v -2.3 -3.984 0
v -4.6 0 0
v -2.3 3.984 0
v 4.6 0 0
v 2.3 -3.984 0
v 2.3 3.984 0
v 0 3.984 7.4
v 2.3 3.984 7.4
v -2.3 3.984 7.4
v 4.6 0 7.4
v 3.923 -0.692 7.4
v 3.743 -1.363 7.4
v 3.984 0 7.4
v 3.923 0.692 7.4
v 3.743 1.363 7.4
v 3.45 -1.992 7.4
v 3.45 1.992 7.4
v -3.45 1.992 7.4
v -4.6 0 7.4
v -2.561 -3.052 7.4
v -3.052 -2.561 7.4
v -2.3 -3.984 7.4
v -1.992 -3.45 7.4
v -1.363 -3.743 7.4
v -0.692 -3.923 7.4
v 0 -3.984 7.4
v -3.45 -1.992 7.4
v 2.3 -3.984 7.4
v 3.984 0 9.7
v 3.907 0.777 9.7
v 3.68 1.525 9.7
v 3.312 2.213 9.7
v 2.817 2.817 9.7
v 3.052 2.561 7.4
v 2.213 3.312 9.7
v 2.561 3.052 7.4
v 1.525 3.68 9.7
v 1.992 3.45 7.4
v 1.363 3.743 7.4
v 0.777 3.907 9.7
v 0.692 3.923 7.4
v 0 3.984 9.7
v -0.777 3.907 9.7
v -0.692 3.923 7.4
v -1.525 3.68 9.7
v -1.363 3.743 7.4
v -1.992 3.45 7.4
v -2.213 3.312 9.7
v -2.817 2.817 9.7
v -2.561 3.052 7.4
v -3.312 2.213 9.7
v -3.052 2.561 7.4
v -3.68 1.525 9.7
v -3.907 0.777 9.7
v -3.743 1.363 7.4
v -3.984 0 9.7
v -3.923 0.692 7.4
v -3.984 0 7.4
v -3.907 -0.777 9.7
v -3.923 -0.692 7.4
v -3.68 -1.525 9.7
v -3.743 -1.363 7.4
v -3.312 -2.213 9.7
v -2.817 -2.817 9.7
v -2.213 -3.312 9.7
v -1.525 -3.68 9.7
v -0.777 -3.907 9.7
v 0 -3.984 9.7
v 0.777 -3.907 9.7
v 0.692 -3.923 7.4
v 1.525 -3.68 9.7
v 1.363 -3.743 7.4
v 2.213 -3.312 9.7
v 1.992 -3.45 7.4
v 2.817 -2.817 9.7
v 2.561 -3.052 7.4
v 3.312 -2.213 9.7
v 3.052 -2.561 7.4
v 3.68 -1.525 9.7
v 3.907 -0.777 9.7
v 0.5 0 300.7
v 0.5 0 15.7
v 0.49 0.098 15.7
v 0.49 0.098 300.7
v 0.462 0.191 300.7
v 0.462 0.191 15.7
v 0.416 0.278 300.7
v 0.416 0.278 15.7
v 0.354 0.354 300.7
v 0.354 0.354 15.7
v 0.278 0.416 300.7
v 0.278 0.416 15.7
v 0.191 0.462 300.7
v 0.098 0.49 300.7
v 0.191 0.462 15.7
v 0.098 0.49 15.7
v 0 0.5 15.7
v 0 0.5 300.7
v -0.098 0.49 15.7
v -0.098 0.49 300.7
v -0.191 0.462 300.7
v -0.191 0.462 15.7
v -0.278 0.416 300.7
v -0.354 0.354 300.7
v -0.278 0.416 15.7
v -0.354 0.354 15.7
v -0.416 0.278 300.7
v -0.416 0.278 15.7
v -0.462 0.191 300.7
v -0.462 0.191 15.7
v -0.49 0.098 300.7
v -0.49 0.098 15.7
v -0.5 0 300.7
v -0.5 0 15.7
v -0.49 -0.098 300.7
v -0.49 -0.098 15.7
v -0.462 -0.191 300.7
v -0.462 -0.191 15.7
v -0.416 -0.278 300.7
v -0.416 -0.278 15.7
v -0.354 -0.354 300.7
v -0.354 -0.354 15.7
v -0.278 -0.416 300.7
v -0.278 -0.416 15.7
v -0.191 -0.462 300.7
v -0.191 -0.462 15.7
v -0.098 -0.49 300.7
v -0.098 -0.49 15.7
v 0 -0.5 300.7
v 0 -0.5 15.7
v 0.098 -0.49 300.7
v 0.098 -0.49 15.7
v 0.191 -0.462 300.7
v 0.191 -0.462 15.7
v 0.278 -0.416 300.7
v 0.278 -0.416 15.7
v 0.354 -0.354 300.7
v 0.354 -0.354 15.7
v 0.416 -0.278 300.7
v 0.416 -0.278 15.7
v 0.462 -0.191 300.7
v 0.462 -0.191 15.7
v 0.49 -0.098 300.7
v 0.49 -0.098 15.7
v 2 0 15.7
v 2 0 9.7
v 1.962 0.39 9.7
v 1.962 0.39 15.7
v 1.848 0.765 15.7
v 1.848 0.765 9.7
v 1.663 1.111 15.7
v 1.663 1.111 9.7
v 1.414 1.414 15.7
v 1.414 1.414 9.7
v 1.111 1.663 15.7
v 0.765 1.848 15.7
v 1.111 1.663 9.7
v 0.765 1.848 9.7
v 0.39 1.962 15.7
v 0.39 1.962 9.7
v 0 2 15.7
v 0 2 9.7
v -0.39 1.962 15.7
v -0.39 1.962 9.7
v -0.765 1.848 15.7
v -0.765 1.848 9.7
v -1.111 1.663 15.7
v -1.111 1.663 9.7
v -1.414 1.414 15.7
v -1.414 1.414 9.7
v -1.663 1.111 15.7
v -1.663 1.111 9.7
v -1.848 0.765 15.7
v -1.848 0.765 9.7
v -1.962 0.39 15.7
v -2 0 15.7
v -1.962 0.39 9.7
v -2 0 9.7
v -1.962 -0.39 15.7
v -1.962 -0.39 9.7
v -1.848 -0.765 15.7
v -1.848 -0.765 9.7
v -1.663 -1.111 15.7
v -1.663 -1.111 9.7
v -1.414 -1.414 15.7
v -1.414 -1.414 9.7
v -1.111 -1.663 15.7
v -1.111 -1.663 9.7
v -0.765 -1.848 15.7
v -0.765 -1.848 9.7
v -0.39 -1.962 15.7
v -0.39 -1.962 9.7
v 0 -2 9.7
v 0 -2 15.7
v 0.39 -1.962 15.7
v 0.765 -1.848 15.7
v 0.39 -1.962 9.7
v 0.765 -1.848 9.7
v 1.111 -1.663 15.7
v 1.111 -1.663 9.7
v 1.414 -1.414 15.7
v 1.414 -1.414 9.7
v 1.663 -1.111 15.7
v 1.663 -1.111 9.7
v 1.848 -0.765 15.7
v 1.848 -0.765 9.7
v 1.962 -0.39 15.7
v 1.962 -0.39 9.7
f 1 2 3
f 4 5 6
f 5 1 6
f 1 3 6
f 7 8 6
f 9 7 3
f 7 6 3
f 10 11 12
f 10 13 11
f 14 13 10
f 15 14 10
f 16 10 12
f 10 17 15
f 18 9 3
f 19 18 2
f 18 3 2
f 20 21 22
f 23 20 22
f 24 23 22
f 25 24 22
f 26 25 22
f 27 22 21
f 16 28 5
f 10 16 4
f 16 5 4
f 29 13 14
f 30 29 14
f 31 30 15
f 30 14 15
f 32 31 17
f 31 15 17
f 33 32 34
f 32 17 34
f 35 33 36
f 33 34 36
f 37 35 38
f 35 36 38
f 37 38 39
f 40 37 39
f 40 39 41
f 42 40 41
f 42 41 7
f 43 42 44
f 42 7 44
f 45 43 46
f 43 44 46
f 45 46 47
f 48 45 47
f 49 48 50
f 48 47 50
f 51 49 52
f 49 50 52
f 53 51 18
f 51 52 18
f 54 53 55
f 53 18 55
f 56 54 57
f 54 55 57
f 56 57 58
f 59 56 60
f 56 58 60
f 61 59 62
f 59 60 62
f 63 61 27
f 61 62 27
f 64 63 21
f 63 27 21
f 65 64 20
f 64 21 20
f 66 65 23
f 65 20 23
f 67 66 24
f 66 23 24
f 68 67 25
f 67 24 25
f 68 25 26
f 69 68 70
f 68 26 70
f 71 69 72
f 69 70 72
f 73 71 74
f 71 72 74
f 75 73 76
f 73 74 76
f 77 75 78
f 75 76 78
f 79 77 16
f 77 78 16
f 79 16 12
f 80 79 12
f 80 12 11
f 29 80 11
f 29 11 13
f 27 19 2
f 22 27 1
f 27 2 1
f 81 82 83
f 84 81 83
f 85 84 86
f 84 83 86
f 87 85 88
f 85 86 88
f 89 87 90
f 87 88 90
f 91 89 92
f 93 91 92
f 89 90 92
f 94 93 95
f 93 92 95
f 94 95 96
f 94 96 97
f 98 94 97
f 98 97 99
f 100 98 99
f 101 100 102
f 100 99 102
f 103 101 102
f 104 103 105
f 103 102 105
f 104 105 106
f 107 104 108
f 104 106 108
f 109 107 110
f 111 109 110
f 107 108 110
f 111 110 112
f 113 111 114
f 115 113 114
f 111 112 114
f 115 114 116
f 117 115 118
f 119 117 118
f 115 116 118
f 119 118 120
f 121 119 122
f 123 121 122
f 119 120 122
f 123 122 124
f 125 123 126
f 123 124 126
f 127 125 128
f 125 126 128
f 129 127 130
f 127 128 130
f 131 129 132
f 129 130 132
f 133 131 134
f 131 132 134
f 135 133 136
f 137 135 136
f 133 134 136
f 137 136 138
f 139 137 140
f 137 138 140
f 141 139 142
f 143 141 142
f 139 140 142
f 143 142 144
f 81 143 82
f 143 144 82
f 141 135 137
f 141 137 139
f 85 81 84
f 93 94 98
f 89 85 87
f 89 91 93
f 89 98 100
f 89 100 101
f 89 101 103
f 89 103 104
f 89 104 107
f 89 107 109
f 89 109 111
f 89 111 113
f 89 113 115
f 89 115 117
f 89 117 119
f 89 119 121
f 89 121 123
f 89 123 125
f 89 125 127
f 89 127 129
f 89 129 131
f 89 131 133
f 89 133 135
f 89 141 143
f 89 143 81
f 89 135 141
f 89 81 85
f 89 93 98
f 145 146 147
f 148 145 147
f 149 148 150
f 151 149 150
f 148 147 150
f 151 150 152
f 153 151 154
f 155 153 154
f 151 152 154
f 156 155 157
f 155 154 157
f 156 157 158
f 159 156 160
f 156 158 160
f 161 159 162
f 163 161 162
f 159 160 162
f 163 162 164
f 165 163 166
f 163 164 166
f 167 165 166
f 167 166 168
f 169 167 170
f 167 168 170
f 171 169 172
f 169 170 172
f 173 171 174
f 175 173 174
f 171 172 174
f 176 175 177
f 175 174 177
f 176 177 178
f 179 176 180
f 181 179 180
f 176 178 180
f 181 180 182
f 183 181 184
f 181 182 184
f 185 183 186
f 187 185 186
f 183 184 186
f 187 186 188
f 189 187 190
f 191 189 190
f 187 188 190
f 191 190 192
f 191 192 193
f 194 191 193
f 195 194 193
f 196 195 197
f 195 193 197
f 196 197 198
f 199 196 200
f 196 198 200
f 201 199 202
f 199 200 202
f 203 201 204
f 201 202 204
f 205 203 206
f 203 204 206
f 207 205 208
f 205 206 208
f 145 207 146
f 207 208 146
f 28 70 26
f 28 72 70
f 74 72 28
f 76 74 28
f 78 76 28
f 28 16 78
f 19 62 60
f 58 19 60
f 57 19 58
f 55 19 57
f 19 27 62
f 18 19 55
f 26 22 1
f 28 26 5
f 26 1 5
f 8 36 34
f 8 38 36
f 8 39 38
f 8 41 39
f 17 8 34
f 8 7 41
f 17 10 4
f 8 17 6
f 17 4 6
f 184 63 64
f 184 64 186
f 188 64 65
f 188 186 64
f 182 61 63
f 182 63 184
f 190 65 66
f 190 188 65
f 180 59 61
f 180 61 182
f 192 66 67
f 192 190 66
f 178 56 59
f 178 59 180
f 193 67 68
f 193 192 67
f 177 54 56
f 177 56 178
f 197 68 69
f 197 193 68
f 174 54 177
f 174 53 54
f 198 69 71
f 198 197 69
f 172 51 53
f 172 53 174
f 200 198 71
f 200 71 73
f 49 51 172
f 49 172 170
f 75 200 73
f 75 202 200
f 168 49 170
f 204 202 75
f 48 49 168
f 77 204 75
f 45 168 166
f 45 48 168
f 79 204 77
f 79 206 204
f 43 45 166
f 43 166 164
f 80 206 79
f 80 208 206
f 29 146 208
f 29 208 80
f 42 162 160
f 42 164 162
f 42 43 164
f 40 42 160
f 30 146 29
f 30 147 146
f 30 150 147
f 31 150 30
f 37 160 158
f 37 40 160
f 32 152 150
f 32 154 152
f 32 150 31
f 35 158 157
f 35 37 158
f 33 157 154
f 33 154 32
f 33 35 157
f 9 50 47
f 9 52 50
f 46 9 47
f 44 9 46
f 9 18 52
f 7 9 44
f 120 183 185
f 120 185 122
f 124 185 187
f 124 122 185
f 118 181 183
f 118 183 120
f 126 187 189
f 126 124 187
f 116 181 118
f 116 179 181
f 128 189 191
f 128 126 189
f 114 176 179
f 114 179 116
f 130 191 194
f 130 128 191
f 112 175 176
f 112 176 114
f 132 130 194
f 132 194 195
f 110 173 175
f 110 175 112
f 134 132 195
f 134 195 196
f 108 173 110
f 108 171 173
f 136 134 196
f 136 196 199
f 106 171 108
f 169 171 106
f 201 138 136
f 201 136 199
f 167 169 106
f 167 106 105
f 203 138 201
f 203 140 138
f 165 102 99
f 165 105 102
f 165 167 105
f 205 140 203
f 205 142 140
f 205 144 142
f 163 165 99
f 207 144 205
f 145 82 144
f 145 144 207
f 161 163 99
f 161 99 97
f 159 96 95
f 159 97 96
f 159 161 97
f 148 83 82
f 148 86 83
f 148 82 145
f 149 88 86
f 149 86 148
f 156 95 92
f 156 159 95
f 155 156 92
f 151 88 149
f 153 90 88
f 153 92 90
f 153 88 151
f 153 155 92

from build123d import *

# Parameters (mm, degrees)
BOSS_EXTRUDE1_DEPTH = 7.4
SKETCH2_R           = 3.983716857
BOSS_EXTRUDE2_DEPTH = 2.3
SKETCH3_R           = 2
BOSS_EXTRUDE3_DEPTH = 6
SKETCH4_R           = 0.5
BOSS_EXTRUDE4_DEPTH = 285


with BuildPart() as part:
    # Sketch1 → Boss-Extrude1 (new body)
    with BuildSketch(Plane.XY):
        Polygon((2.3, -3.983716857), (4.6, 0), (2.3, 3.983716857), (-2.3, 3.983716857), (-4.6, 0), (-2.3, -3.983716857), align=None)
    extrude(amount=BOSS_EXTRUDE1_DEPTH)

    # Sketch2 → Boss-Extrude2 (add)
    with BuildSketch(Plane.XY.offset(7.4)):
        Circle(SKETCH2_R)
    extrude(amount=BOSS_EXTRUDE2_DEPTH)

    # Sketch3 → Boss-Extrude3 (add)
    with BuildSketch(Plane.XY.offset(9.7)):
        Circle(SKETCH3_R)
    extrude(amount=BOSS_EXTRUDE3_DEPTH)

    # Sketch4 → Boss-Extrude4 (add)
    with BuildSketch(Plane.XY.offset(15.7)):
        Circle(SKETCH4_R)
    extrude(amount=BOSS_EXTRUDE4_DEPTH)


solid = part.part
